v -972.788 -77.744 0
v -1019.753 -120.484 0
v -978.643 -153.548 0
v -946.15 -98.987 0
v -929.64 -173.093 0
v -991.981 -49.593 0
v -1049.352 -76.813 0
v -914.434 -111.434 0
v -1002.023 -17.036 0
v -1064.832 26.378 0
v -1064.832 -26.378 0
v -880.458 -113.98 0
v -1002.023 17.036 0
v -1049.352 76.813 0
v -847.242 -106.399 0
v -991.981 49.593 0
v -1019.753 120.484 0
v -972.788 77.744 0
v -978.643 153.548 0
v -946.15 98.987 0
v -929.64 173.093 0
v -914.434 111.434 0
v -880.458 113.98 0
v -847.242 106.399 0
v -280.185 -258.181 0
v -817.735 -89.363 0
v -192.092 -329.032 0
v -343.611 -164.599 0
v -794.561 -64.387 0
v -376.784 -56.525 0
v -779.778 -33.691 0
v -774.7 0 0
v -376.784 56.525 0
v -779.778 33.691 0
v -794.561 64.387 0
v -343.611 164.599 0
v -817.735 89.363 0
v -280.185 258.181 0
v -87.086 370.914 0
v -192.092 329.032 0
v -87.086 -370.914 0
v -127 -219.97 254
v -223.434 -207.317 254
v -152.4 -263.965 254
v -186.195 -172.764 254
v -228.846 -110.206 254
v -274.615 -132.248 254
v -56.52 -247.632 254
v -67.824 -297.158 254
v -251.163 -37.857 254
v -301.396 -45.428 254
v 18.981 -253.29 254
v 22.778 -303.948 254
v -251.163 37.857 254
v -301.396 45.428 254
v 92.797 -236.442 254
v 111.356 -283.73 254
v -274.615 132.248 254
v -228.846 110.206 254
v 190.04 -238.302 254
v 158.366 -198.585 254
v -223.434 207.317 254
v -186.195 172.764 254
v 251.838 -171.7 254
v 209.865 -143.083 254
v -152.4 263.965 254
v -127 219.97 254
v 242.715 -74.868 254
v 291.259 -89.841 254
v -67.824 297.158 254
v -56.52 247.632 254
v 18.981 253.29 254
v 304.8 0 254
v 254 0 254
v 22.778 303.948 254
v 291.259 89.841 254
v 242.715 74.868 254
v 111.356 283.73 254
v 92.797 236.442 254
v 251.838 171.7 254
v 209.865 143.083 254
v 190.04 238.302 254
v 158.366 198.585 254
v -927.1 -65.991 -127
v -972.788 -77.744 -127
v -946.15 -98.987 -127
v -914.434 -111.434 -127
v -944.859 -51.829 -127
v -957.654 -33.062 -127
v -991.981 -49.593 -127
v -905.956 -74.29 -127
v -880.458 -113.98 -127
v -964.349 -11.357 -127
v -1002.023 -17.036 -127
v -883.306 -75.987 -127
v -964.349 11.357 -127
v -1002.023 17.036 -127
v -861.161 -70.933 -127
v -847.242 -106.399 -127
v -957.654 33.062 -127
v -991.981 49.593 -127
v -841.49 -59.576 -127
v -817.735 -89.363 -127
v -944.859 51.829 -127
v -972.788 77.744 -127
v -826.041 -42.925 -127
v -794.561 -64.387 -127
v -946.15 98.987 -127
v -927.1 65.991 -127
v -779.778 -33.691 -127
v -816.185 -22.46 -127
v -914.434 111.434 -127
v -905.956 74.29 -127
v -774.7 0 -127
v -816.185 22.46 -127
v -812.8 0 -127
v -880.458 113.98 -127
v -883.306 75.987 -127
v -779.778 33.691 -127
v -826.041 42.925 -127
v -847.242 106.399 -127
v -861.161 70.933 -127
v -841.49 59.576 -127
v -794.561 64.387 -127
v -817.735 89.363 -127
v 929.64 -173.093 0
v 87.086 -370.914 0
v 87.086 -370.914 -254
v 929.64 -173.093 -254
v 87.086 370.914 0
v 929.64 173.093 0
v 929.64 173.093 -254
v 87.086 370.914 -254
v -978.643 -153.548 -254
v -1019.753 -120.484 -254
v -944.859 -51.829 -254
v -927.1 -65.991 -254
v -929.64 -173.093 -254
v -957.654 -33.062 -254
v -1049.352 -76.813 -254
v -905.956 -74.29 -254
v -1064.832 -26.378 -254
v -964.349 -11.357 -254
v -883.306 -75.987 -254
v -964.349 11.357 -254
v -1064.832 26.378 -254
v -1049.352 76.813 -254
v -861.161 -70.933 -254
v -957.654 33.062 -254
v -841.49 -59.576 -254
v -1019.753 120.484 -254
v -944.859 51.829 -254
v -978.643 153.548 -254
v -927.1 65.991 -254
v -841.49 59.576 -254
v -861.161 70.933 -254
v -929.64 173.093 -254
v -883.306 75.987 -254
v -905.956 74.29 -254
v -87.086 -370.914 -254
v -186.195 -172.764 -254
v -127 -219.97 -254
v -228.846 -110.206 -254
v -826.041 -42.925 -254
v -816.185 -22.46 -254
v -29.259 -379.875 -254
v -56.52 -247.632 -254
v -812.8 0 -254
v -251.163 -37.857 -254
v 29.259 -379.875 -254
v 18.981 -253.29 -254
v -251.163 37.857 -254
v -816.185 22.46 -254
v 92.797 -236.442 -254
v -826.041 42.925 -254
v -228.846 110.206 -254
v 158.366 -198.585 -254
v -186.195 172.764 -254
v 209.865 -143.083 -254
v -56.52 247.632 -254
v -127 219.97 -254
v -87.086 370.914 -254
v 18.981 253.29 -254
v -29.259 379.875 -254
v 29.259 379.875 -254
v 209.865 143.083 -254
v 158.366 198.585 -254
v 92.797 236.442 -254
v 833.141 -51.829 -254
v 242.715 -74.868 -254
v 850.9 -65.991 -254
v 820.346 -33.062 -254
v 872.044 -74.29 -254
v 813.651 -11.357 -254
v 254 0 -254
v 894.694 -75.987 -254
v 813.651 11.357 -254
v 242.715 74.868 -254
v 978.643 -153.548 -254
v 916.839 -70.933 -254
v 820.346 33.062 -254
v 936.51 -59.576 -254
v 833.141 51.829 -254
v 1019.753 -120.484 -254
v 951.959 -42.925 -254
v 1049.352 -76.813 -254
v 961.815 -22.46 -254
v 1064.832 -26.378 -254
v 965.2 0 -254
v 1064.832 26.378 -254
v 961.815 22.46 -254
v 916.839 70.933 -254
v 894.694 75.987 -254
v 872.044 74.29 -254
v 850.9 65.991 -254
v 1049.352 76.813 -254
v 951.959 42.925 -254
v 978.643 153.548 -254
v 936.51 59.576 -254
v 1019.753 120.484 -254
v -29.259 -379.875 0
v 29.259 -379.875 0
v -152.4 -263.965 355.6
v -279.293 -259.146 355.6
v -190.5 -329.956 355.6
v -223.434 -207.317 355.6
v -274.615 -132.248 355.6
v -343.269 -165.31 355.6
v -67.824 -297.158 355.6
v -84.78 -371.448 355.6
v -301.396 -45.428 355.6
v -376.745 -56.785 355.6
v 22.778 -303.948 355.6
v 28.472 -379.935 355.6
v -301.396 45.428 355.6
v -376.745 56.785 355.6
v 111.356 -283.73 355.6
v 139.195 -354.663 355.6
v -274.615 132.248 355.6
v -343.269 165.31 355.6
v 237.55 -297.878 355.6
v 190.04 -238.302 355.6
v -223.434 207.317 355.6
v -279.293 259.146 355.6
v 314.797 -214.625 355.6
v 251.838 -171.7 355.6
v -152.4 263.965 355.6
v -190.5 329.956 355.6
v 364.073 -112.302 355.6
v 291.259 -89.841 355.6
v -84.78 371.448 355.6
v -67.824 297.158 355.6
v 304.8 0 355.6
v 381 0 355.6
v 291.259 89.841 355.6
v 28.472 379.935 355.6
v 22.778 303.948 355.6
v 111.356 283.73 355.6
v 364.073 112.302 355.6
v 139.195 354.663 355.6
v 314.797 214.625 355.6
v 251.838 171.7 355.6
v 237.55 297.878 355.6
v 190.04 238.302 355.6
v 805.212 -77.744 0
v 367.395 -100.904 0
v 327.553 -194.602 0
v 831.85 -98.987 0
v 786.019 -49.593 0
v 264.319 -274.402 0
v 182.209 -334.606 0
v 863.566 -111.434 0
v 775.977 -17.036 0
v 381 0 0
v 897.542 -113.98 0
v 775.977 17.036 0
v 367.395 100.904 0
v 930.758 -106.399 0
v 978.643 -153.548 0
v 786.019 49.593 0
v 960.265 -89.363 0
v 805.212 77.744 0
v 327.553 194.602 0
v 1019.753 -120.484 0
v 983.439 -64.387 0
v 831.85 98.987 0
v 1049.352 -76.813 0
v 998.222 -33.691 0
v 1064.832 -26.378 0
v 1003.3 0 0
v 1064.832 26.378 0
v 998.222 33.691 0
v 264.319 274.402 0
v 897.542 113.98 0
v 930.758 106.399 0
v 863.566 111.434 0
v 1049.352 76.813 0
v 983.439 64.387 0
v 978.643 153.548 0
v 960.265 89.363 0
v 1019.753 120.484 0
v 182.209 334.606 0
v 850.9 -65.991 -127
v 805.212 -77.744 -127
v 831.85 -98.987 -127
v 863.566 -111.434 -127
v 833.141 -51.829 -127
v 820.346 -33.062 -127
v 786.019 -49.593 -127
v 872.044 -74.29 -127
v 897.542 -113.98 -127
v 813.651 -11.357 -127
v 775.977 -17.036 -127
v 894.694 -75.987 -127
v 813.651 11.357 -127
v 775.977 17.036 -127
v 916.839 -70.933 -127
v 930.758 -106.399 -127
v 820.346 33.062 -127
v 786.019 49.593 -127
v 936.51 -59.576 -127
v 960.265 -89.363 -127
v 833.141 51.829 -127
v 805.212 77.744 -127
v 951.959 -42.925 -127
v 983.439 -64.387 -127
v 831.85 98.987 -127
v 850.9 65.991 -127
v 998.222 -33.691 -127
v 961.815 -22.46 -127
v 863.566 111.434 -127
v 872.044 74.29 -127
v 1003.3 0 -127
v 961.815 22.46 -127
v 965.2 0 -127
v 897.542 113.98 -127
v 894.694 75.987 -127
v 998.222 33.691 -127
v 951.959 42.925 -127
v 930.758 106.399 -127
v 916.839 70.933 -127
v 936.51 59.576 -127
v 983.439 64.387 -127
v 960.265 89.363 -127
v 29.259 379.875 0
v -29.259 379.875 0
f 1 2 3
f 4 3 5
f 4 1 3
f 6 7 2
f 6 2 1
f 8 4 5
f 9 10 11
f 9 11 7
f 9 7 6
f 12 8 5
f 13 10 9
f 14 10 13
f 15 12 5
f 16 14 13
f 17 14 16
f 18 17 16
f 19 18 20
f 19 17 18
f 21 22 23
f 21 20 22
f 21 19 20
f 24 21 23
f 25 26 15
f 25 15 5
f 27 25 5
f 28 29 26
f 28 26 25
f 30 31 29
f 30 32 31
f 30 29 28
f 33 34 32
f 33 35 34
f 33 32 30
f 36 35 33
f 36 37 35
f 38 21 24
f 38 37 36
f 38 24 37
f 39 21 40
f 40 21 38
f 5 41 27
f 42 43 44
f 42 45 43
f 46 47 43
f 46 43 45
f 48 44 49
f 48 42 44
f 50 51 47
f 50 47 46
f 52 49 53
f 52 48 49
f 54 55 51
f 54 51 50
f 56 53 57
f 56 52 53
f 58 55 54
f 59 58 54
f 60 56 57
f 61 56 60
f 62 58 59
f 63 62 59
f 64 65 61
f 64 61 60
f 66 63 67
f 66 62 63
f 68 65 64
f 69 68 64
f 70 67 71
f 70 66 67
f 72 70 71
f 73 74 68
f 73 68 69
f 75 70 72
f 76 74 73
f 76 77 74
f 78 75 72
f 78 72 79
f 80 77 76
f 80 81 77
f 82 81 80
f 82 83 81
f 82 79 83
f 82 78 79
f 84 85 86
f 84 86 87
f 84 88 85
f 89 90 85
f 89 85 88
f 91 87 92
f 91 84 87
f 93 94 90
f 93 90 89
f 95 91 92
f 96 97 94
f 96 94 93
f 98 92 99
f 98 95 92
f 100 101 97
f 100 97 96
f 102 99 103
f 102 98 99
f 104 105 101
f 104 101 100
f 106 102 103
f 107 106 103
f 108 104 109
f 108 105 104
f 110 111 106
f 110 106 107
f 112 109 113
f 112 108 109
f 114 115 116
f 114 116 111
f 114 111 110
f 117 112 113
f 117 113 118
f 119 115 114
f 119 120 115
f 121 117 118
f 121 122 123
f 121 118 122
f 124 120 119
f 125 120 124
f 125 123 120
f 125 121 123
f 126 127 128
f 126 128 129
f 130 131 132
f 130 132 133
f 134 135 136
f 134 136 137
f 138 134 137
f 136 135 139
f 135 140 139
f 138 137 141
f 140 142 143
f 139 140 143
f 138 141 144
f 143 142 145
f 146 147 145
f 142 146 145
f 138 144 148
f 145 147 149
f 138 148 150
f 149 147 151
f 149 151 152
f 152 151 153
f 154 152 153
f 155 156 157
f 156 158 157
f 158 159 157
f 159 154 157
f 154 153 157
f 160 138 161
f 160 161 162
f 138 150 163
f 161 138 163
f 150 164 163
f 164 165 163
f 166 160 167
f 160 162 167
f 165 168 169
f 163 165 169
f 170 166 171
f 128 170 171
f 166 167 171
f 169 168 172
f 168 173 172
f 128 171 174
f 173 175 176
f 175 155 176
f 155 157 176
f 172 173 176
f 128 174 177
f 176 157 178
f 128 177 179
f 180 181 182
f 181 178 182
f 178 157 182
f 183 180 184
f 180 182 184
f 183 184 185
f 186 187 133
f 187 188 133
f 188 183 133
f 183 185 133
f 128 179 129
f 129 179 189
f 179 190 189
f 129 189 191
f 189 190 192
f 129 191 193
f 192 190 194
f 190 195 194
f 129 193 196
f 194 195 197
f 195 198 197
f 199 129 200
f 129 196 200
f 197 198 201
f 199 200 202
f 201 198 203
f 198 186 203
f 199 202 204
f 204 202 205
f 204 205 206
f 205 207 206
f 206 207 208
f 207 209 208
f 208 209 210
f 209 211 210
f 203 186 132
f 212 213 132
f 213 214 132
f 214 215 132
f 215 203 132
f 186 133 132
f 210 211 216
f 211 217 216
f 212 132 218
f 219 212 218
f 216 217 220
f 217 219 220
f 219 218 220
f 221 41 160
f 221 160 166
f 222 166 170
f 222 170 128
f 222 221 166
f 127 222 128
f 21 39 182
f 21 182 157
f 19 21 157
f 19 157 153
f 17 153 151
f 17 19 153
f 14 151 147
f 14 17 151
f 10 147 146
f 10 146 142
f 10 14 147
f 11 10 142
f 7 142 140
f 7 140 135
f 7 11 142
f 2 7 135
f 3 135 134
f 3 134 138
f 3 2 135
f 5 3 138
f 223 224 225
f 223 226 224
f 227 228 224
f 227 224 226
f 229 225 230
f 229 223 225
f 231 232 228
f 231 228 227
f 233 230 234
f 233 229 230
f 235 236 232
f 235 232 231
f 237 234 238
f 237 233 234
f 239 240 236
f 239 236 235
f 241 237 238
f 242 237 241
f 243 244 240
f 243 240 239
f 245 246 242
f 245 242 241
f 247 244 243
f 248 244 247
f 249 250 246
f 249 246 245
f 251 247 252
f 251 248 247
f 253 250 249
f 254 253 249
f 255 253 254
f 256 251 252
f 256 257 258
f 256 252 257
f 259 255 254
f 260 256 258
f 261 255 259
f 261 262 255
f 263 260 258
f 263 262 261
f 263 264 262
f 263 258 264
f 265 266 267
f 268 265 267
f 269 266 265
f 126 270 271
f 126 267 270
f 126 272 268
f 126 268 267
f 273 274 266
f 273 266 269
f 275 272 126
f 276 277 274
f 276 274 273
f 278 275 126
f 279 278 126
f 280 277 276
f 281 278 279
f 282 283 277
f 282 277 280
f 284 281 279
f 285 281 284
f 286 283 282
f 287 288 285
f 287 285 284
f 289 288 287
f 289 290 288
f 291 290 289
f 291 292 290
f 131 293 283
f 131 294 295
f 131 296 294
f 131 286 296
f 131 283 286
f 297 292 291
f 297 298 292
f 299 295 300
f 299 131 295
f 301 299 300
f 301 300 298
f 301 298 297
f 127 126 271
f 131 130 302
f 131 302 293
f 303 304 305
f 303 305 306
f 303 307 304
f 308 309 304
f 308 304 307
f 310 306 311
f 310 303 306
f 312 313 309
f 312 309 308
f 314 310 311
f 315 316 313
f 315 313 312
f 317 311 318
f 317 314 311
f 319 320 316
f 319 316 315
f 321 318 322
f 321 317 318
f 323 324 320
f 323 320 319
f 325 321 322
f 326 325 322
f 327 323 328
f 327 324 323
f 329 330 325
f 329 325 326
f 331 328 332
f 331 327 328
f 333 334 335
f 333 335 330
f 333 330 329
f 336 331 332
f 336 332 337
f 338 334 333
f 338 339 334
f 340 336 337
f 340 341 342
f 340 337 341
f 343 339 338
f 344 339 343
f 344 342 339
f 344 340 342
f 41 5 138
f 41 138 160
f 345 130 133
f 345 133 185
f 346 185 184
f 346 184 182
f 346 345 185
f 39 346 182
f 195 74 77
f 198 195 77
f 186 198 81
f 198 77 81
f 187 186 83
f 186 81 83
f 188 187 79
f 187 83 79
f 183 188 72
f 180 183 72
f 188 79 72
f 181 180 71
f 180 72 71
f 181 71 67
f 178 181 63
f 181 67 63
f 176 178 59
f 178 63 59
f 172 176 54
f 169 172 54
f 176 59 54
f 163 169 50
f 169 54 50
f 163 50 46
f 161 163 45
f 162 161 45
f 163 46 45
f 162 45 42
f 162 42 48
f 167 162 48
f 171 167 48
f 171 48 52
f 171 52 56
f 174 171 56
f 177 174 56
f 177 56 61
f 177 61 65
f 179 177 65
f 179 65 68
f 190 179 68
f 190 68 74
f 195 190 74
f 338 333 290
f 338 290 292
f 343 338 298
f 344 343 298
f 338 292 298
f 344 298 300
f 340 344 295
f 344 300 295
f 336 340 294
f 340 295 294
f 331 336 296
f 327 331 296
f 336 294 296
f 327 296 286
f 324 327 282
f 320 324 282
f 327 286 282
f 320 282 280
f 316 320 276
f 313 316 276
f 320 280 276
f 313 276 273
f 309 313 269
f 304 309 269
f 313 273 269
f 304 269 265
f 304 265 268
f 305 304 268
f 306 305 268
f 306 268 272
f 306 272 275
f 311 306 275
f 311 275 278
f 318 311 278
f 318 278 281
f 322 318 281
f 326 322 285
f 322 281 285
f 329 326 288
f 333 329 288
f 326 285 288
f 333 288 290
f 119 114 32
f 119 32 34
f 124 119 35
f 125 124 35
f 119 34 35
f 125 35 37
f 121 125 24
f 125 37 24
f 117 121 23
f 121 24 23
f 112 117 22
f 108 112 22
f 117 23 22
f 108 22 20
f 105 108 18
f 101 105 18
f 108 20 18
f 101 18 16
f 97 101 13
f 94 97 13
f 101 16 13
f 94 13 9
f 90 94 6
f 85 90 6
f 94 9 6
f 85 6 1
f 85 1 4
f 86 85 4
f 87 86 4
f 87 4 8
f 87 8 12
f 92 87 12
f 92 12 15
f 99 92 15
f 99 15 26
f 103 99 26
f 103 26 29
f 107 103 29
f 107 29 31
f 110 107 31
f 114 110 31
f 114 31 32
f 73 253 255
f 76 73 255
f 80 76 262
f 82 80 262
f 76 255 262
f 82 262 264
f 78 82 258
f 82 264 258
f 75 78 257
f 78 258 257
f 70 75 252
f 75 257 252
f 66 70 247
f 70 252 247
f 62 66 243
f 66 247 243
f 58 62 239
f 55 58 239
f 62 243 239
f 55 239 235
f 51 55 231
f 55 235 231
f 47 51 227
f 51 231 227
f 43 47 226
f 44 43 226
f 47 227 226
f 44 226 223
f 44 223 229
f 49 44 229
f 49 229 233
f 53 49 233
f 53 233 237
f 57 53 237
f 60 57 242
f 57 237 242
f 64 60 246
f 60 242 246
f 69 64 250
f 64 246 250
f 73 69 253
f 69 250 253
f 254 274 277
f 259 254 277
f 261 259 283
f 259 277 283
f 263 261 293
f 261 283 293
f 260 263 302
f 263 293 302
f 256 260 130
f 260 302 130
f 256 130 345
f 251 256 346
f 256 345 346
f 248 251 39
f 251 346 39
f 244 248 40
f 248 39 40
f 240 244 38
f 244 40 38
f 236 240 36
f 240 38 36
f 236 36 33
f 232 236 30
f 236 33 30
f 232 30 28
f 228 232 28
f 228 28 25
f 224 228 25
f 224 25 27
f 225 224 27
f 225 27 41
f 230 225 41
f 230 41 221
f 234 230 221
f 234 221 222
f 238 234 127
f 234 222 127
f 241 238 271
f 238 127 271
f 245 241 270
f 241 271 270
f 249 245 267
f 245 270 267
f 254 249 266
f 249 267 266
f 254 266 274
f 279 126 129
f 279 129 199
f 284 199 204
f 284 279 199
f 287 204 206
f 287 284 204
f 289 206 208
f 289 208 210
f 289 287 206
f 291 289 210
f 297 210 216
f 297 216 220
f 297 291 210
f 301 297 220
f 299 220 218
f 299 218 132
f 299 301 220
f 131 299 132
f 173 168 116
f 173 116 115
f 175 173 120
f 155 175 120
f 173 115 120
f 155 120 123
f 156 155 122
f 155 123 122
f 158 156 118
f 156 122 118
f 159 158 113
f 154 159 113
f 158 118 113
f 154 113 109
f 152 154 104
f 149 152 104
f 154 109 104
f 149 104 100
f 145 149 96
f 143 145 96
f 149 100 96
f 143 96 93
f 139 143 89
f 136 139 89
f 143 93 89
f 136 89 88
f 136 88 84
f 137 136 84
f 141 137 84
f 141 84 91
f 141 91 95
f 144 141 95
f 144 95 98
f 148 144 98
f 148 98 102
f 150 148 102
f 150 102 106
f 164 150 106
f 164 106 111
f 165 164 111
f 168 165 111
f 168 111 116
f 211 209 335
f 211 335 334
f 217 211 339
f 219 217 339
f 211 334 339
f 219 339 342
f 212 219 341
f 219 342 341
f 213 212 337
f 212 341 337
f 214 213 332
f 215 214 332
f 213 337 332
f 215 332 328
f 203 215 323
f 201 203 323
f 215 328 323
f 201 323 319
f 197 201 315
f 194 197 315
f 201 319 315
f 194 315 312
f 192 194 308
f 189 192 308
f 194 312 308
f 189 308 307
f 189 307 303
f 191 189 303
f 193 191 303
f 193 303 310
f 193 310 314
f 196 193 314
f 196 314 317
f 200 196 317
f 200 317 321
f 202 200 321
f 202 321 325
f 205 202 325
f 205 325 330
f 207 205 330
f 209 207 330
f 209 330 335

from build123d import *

# Parameters (mm, degrees)
F1_DEPTH  = 254
F2_R      = 381
F3_DEPTH  = 355.6
F4_R      = 76.2
F5_DEPTH  = 254
F6_R      = 76.2
F7_DEPTH  = 254
F8_R      = 114.3
F8_R_2    = 76.2
F9_DEPTH  = 127
F10_DEPTH = 25.4
F11_R     = 114.3
F12_DEPTH = 127
F13_R     = 254
F14_DEPTH = 609.6
F15_R     = 304.8
F16_DEPTH = 101.6


with BuildPart() as f1:
    # F0 (on Top) → F1 (new body)
    with BuildSketch(Plane.XY):
        with BuildLine():
            ThreePointArc((87.085714, -370.913842), (298.614013, -236.62348), (381, 0))
            ThreePointArc((381, 0), (298.614013, 236.62348), (87.085714, 370.913842))
            ThreePointArc((87.085714, 370.913842), (0, 381), (-87.085714, 370.913842))
            ThreePointArc((-87.085714, 370.913842), (-381, 0), (-87.085714, -370.913842))
            ThreePointArc((-87.085714, -370.913842), (0, -381), (87.085714, -370.913842))
        make_face()
        with BuildLine():
            ThreePointArc((87.085714, 370.913842), (298.614013, 236.62348), (381, 0))
            ThreePointArc((381, 0), (298.614013, -236.62348), (87.085714, -370.913842))
            Line((87.085714, -370.913842), (929.64, -173.093126))
            ThreePointArc((929.64, -173.093126), (1066.8, 0), (929.64, 173.093126))
            Line((929.64, 173.093126), (87.085714, 370.913842))
        make_face()
        with BuildLine():
            ThreePointArc((-87.085714, -370.913842), (-381, 0), (-87.085714, 370.913842))
            Line((-87.085714, 370.913842), (-929.64, 173.093126))
            ThreePointArc((-929.64, 173.093126), (-1066.8, 0), (-929.64, -173.093126))
            Line((-929.64, -173.093126), (-87.085714, -370.913842))
        make_face()
    extrude(amount=-F1_DEPTH)

    # F2 (on face) → F3 (join)
    with BuildSketch(Plane.XY):
        Circle(F2_R)
    extrude(amount=F3_DEPTH)

    # F4 (on face) → F5 (cut)
    with BuildSketch(Plane.XY):
        with Locations((-889, 0)):
            Circle(F4_R)
    extrude(amount=-F5_DEPTH, mode=Mode.SUBTRACT)

    # F6 (on face) → F7 (cut)
    with BuildSketch(Plane.XY):
        with Locations((889, 0)):
            Circle(F6_R)
    extrude(amount=-F7_DEPTH, mode=Mode.SUBTRACT)

    # F8 (on face) → F9 (cut)
    with BuildSketch(Plane.XY):
        with Locations((-889, 0)):
            Circle(F8_R)
        with Locations((-889, 0)):
            Circle(F8_R_2, mode=Mode.SUBTRACT)
    extrude(amount=-F9_DEPTH, mode=Mode.SUBTRACT)

    # F8 (on face) → F10 (cut)
    with BuildSketch(Plane.XY):
        with Locations((-889, 0)):
            Circle(F8_R)
        with Locations((-889, 0)):
            Circle(F8_R_2, mode=Mode.SUBTRACT)
    extrude(amount=-F10_DEPTH, mode=Mode.SUBTRACT)

    # F11 (on face) → F12 (cut)
    with BuildSketch(Plane.XY):
        with Locations((889, 0)):
            Circle(F11_R)
    extrude(amount=-F12_DEPTH, mode=Mode.SUBTRACT)

    # F13 (on face) → F14 (cut)
    with BuildSketch(Plane.XY.offset(355.6)):
        Circle(F13_R)
    extrude(amount=-F14_DEPTH, mode=Mode.SUBTRACT)

    # F15 (on face) → F16 (cut)
    with BuildSketch(Plane.XY.offset(355.6)):
        Circle(F15_R)
    extrude(amount=-F16_DEPTH, mode=Mode.SUBTRACT)


solid = f1.part
